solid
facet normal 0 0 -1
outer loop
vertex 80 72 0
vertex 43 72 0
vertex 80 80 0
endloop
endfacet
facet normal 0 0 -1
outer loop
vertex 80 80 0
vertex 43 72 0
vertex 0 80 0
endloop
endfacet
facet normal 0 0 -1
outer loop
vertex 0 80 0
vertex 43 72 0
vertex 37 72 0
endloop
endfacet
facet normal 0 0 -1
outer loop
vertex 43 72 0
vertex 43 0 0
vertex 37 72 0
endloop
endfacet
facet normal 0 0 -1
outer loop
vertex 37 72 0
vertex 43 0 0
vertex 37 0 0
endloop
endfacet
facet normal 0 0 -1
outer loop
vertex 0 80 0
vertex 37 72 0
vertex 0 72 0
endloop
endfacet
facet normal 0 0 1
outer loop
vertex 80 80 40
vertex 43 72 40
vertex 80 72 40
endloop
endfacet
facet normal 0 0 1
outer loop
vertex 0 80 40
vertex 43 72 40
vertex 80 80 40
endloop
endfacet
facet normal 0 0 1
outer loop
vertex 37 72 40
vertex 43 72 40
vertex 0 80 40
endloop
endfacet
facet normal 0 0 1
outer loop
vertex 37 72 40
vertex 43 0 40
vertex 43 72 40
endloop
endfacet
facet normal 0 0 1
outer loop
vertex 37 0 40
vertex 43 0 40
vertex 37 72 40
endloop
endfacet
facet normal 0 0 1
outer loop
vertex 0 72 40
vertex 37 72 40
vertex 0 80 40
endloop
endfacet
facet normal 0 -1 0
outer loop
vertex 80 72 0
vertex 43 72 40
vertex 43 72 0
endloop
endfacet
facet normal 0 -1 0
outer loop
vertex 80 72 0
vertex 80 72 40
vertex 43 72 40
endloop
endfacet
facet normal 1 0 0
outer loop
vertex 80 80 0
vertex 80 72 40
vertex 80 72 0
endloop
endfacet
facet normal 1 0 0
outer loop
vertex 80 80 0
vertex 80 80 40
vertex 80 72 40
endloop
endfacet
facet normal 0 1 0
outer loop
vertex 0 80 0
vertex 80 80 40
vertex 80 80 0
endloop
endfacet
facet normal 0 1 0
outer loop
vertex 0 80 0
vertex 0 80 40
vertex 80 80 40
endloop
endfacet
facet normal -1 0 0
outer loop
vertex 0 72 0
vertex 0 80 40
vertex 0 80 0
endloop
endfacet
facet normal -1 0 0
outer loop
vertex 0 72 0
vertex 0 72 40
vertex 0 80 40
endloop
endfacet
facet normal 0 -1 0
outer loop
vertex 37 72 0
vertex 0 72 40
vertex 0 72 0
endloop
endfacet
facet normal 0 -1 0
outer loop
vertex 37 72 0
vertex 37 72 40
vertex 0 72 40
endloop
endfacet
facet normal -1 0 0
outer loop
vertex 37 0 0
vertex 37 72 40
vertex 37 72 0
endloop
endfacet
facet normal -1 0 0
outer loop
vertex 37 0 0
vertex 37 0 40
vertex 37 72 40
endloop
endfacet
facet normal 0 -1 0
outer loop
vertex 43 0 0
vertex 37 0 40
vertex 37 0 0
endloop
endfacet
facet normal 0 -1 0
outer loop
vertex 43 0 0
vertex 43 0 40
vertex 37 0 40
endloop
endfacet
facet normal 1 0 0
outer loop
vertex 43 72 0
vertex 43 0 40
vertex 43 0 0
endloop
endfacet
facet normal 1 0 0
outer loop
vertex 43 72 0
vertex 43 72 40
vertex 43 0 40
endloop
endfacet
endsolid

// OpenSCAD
$fn = 32;

// ----------------------------------------------------------------------
// Structural section: tee 80 x 80 mm
// ----------------------------------------------------------------------

// --- parameters (mm) ---
sec_w = 80;               // tee width, X
sec_h = 80;               // tee height, Y
flange_t = 8;             // top flange thickness
web_t = 6;                // web thickness
plate_t = 40;             // cut length, Z (extrusion height)

profile = [[37, 0], [43, 0], [43, 72], [80, 72], [80, 80], [0, 80], [0, 72], [37, 72]];  // primary outline, 8 points, counter clockwise

// --- the one profile operation ---
linear_extrude(height = plate_t) polygon(points = profile);
